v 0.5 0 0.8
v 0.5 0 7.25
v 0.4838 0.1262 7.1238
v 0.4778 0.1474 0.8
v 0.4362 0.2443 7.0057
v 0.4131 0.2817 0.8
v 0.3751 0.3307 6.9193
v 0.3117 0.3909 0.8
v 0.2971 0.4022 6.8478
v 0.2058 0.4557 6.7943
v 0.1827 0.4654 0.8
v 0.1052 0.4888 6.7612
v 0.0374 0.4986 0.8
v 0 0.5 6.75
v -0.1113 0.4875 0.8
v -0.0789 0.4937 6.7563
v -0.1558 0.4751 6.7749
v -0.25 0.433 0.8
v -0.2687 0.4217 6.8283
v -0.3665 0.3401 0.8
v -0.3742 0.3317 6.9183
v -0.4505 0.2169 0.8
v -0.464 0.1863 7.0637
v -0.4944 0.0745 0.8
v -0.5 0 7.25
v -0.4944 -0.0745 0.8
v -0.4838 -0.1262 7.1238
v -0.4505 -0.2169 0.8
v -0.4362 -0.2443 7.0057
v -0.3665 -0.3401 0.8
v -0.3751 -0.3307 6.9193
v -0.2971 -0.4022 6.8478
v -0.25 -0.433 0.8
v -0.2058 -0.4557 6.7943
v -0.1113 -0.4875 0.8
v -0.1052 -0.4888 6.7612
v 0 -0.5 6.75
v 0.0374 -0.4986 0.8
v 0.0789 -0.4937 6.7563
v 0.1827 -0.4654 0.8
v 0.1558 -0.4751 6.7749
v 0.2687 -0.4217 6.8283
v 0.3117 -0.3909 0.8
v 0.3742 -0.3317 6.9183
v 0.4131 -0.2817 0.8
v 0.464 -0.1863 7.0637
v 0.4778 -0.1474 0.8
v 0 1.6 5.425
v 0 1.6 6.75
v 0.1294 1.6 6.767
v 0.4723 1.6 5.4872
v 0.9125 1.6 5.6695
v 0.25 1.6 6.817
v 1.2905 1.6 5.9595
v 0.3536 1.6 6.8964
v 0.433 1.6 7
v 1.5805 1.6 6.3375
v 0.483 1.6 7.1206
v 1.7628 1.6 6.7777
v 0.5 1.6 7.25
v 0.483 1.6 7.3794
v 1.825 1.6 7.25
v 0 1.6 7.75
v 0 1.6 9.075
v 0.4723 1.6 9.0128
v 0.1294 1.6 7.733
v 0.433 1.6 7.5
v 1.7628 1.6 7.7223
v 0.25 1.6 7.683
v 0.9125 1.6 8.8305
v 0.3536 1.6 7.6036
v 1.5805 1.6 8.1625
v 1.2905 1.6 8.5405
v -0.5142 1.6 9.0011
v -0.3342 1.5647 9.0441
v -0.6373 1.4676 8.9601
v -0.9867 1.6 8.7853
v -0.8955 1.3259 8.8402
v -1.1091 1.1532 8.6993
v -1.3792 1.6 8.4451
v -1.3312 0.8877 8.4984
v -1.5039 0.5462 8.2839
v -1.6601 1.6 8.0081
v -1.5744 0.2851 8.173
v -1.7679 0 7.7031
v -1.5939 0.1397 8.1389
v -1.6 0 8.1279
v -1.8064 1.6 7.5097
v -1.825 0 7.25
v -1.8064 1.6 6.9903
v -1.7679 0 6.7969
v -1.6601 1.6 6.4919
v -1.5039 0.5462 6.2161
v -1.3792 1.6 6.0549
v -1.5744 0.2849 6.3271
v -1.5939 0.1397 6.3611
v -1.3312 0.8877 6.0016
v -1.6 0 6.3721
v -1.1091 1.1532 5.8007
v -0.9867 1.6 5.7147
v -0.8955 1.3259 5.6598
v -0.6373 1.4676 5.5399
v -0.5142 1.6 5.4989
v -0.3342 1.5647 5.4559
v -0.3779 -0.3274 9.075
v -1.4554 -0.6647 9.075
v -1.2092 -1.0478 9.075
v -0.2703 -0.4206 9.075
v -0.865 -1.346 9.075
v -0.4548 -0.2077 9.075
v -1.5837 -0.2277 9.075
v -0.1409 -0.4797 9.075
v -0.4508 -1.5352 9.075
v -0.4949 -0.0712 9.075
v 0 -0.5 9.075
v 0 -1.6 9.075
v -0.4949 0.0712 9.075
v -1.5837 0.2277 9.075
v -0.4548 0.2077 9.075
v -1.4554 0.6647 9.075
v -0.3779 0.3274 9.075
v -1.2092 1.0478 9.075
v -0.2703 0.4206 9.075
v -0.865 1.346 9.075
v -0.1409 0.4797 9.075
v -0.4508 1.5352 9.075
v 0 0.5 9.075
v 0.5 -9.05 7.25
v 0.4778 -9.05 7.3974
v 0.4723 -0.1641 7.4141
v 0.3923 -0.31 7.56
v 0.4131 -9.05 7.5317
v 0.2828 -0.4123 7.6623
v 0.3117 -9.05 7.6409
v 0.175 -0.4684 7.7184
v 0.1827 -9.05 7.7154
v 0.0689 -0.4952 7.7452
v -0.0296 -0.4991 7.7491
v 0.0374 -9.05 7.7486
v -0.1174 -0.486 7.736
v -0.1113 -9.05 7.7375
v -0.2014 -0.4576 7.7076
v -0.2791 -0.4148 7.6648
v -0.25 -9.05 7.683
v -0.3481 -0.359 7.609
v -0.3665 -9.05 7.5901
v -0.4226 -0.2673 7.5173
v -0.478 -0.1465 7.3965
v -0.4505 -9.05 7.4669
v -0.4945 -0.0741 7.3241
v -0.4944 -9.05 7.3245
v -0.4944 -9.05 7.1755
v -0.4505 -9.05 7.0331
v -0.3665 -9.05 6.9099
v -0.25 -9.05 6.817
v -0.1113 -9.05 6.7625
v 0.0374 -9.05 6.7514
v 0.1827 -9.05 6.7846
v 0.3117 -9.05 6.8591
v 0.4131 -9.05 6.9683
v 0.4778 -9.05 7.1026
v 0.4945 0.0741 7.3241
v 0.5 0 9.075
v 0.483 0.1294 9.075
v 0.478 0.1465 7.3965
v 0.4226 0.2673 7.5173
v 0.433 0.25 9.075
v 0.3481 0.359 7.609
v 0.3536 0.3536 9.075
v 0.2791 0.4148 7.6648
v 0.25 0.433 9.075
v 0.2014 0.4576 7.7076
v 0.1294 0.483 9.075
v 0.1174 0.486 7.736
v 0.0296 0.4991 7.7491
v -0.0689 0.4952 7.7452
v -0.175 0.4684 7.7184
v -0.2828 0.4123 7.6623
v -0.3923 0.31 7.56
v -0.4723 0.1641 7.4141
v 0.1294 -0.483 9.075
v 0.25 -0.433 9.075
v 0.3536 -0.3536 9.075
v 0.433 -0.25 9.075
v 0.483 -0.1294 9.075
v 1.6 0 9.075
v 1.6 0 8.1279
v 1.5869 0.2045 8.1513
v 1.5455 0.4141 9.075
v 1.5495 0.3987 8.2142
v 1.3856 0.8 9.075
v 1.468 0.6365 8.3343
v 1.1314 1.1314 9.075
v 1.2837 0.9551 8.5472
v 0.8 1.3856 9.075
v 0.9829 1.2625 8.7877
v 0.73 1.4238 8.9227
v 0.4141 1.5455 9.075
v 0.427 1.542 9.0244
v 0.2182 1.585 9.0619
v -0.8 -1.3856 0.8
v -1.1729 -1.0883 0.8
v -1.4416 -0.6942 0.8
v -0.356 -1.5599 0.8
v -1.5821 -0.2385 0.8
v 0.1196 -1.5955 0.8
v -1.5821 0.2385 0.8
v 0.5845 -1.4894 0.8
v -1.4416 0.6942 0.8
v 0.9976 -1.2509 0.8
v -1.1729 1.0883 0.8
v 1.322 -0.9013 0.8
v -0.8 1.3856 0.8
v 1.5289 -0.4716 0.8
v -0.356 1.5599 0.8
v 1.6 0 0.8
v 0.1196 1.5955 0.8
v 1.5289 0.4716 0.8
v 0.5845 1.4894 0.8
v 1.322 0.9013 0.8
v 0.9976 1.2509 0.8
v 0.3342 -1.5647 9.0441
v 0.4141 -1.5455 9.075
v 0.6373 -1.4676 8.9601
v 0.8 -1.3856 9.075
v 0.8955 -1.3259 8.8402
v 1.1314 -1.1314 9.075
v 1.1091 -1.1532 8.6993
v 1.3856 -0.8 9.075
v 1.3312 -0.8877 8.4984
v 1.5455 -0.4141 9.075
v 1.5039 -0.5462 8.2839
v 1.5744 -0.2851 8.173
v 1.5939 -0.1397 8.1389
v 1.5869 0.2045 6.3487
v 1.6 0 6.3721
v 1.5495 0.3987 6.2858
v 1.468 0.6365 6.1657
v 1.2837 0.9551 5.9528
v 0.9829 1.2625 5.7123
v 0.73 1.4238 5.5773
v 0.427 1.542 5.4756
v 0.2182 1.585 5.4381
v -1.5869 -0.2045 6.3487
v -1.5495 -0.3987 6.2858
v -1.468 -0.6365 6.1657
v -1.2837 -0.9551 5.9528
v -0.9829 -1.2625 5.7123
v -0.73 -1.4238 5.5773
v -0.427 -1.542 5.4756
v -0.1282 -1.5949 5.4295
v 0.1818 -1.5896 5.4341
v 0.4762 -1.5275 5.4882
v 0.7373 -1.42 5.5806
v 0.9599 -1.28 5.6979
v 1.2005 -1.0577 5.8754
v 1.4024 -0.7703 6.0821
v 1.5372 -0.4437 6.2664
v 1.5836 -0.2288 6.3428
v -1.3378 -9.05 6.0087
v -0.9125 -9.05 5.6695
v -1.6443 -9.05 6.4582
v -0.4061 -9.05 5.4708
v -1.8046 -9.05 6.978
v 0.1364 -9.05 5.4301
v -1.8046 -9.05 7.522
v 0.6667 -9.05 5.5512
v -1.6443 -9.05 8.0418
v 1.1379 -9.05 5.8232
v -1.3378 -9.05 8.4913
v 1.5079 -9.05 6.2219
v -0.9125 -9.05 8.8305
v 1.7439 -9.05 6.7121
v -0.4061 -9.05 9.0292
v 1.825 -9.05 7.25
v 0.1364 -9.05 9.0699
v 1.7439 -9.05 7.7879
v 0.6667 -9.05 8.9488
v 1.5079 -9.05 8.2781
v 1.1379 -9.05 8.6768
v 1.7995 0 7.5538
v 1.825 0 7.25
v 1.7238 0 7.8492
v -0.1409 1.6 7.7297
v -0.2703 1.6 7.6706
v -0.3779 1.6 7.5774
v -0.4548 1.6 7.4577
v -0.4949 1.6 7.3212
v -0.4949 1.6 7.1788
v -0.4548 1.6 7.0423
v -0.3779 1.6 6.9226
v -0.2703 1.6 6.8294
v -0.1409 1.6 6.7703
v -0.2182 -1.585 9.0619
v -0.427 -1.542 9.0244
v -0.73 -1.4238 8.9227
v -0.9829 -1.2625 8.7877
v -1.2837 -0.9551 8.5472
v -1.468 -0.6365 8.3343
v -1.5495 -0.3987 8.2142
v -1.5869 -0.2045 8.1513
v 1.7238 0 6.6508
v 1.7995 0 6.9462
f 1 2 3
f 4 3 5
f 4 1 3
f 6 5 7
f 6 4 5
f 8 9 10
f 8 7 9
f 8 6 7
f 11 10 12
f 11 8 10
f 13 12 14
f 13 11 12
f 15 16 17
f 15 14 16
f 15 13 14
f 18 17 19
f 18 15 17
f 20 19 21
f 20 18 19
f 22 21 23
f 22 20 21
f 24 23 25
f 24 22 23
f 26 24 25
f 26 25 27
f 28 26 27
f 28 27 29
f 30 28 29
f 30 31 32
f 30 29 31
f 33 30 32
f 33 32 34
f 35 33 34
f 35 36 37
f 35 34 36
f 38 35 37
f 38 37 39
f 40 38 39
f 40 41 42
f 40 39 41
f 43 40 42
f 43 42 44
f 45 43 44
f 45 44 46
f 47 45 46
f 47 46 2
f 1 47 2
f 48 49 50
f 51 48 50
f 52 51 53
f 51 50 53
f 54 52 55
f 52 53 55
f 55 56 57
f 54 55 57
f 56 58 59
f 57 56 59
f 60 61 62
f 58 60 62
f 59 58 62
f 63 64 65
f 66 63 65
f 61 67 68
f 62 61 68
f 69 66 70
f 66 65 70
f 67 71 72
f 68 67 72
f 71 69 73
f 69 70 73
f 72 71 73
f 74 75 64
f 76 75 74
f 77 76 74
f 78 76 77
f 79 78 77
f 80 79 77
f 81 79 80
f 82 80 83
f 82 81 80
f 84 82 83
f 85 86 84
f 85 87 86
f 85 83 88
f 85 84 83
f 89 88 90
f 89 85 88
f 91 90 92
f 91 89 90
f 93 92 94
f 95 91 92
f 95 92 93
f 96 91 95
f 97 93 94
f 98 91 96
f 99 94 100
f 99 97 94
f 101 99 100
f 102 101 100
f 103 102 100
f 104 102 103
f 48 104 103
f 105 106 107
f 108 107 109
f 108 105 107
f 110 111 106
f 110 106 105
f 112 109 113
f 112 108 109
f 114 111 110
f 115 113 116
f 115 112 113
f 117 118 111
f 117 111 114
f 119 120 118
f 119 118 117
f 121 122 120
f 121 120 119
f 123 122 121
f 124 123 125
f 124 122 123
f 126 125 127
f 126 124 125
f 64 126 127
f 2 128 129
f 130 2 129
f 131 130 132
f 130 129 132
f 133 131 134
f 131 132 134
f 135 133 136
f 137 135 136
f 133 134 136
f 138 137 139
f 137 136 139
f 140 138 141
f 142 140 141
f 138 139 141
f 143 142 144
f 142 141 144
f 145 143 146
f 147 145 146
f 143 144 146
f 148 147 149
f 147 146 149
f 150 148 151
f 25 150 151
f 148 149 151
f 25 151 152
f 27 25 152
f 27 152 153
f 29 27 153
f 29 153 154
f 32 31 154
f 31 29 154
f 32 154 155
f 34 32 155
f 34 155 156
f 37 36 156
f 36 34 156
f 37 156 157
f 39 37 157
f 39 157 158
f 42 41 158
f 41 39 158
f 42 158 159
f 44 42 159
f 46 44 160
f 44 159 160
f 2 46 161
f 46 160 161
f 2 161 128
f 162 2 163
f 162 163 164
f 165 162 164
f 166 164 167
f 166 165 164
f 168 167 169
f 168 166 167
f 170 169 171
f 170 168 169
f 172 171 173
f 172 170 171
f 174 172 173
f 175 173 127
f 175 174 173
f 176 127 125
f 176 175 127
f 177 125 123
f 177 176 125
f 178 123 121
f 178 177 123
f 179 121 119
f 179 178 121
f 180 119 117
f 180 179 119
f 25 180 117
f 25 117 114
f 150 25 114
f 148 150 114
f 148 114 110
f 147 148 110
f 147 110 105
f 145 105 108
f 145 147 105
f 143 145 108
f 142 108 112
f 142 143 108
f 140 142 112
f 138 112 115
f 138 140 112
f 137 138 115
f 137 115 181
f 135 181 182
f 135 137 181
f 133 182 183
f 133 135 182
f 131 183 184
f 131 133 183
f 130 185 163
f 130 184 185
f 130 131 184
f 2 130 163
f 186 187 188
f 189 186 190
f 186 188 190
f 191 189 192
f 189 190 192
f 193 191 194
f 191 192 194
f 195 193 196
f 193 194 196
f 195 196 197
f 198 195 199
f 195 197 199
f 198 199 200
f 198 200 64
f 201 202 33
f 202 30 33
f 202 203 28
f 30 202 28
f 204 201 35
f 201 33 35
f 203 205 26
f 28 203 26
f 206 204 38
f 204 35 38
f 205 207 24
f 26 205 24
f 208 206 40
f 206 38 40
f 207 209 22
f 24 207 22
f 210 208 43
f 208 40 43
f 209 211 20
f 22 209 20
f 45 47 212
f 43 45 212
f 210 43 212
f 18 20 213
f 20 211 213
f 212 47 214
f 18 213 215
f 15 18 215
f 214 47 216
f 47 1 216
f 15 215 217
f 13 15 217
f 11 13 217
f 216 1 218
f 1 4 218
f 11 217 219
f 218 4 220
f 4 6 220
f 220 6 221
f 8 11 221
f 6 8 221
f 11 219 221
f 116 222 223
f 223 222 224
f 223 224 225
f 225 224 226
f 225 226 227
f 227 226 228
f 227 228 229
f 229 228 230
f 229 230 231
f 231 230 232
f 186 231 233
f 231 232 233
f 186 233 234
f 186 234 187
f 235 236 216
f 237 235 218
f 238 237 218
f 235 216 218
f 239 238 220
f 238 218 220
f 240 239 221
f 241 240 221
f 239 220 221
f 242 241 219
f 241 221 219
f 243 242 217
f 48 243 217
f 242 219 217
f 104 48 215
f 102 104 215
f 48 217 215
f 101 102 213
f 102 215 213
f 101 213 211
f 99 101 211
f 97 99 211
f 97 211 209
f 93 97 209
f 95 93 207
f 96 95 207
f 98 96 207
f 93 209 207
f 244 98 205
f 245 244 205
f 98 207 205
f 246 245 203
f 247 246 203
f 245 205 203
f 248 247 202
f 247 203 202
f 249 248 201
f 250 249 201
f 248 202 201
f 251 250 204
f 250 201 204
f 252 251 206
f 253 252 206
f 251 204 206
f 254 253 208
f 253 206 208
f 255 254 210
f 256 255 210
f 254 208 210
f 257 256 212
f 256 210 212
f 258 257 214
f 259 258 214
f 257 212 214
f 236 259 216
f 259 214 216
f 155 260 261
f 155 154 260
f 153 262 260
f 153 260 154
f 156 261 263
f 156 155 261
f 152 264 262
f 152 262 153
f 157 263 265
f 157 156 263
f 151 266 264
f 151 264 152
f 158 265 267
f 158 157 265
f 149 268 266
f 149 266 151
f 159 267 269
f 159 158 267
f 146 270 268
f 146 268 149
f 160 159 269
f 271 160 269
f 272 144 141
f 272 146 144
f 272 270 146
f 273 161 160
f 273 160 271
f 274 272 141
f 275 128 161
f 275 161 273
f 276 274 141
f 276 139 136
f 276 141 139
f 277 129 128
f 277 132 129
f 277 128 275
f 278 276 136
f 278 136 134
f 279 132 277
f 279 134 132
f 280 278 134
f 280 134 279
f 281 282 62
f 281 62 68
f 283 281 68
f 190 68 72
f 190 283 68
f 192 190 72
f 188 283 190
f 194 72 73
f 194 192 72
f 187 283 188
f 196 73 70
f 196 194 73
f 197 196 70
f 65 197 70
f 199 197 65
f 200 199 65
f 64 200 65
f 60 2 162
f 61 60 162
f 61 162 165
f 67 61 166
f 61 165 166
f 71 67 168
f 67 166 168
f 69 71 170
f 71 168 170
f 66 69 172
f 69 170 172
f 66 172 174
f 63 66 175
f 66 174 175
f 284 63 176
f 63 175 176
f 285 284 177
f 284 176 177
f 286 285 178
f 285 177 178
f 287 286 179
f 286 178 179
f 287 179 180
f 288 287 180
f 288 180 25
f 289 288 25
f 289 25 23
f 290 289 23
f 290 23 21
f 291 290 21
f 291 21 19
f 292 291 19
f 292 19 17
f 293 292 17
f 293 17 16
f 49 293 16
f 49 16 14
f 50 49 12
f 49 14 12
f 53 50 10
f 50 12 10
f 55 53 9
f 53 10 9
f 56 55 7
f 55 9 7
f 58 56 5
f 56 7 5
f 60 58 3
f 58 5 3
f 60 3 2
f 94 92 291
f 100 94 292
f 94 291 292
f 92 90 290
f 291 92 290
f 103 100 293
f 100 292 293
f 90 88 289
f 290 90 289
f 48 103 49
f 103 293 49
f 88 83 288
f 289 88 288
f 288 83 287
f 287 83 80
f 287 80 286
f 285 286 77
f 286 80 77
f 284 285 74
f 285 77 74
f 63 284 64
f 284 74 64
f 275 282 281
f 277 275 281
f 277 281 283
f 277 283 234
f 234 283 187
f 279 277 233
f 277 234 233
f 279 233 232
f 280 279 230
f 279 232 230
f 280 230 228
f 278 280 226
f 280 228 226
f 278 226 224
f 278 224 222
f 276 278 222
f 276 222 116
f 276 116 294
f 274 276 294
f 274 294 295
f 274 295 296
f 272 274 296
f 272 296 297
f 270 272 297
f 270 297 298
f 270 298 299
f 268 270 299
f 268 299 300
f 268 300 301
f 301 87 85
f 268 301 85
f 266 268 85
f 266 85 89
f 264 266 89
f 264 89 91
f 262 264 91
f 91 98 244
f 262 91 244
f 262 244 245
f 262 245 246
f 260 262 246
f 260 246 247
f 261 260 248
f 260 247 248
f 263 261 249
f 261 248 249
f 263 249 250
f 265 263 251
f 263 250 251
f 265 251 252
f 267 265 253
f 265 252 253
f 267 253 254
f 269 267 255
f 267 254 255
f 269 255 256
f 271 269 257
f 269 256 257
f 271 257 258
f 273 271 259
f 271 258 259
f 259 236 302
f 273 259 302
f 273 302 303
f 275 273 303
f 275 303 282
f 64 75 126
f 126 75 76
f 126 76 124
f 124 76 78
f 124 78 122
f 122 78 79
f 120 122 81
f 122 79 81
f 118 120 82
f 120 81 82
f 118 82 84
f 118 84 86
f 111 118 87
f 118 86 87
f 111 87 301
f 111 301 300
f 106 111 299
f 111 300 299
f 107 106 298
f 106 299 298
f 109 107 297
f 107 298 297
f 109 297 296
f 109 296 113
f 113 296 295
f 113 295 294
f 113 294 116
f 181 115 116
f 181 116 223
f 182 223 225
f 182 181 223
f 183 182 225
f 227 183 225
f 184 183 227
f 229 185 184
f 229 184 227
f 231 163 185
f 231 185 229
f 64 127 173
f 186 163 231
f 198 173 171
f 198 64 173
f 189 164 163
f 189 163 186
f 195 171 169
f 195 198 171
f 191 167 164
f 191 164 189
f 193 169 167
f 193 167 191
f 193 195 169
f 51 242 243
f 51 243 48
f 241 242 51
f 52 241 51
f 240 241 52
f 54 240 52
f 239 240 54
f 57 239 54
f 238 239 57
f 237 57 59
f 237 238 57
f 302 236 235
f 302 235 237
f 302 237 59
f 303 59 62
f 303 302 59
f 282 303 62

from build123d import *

# Parameters (mm, degrees)
SKETCH011_R          = 1.6
PAD002_DEPTH         = 8.275
SKETCH012_R          = 1.825
PAD003_DEPTH         = 9.05
PAD003_DEPTH_BACK    = 1.6
SKETCH013_R          = 0.5
POCKET007_DEPTH      = 0.001
POCKET007_DEPTH_BACK = 9.076
SKETCH014_R          = 0.5
POCKET008_DEPTH      = 10.651


with BuildPart() as part:
    # Sketch011 → Pad002 (new body)
    with BuildSketch(Plane.XY.offset(0.8)):
        Circle(SKETCH011_R)
    extrude(amount=PAD002_DEPTH)

    # Sketch012 → Pad003 (join, two sides)
    with BuildSketch(Plane.XZ) as pad003_sk:
        with Locations((0, 7.25)):
            Circle(SKETCH012_R)
    extrude(amount=PAD003_DEPTH)
    extrude(pad003_sk.sketch, amount=-PAD003_DEPTH_BACK)

    # Sketch013 → Pocket007 (cut, two sides)
    with BuildSketch(Plane.XY) as pocket007_sk:
        Circle(SKETCH013_R)
    extrude(amount=-POCKET007_DEPTH, mode=Mode.SUBTRACT)
    extrude(pocket007_sk.sketch, amount=POCKET007_DEPTH_BACK, mode=Mode.SUBTRACT)

    # Sketch014 (on DatumPlane) → Pocket008 (cut, through all)
    with BuildSketch(Plane.XZ.offset(9.05)):
        with Locations((0, 7.25)):
            Circle(SKETCH014_R)
    extrude(amount=-POCKET008_DEPTH, mode=Mode.SUBTRACT)


solid = part.part
